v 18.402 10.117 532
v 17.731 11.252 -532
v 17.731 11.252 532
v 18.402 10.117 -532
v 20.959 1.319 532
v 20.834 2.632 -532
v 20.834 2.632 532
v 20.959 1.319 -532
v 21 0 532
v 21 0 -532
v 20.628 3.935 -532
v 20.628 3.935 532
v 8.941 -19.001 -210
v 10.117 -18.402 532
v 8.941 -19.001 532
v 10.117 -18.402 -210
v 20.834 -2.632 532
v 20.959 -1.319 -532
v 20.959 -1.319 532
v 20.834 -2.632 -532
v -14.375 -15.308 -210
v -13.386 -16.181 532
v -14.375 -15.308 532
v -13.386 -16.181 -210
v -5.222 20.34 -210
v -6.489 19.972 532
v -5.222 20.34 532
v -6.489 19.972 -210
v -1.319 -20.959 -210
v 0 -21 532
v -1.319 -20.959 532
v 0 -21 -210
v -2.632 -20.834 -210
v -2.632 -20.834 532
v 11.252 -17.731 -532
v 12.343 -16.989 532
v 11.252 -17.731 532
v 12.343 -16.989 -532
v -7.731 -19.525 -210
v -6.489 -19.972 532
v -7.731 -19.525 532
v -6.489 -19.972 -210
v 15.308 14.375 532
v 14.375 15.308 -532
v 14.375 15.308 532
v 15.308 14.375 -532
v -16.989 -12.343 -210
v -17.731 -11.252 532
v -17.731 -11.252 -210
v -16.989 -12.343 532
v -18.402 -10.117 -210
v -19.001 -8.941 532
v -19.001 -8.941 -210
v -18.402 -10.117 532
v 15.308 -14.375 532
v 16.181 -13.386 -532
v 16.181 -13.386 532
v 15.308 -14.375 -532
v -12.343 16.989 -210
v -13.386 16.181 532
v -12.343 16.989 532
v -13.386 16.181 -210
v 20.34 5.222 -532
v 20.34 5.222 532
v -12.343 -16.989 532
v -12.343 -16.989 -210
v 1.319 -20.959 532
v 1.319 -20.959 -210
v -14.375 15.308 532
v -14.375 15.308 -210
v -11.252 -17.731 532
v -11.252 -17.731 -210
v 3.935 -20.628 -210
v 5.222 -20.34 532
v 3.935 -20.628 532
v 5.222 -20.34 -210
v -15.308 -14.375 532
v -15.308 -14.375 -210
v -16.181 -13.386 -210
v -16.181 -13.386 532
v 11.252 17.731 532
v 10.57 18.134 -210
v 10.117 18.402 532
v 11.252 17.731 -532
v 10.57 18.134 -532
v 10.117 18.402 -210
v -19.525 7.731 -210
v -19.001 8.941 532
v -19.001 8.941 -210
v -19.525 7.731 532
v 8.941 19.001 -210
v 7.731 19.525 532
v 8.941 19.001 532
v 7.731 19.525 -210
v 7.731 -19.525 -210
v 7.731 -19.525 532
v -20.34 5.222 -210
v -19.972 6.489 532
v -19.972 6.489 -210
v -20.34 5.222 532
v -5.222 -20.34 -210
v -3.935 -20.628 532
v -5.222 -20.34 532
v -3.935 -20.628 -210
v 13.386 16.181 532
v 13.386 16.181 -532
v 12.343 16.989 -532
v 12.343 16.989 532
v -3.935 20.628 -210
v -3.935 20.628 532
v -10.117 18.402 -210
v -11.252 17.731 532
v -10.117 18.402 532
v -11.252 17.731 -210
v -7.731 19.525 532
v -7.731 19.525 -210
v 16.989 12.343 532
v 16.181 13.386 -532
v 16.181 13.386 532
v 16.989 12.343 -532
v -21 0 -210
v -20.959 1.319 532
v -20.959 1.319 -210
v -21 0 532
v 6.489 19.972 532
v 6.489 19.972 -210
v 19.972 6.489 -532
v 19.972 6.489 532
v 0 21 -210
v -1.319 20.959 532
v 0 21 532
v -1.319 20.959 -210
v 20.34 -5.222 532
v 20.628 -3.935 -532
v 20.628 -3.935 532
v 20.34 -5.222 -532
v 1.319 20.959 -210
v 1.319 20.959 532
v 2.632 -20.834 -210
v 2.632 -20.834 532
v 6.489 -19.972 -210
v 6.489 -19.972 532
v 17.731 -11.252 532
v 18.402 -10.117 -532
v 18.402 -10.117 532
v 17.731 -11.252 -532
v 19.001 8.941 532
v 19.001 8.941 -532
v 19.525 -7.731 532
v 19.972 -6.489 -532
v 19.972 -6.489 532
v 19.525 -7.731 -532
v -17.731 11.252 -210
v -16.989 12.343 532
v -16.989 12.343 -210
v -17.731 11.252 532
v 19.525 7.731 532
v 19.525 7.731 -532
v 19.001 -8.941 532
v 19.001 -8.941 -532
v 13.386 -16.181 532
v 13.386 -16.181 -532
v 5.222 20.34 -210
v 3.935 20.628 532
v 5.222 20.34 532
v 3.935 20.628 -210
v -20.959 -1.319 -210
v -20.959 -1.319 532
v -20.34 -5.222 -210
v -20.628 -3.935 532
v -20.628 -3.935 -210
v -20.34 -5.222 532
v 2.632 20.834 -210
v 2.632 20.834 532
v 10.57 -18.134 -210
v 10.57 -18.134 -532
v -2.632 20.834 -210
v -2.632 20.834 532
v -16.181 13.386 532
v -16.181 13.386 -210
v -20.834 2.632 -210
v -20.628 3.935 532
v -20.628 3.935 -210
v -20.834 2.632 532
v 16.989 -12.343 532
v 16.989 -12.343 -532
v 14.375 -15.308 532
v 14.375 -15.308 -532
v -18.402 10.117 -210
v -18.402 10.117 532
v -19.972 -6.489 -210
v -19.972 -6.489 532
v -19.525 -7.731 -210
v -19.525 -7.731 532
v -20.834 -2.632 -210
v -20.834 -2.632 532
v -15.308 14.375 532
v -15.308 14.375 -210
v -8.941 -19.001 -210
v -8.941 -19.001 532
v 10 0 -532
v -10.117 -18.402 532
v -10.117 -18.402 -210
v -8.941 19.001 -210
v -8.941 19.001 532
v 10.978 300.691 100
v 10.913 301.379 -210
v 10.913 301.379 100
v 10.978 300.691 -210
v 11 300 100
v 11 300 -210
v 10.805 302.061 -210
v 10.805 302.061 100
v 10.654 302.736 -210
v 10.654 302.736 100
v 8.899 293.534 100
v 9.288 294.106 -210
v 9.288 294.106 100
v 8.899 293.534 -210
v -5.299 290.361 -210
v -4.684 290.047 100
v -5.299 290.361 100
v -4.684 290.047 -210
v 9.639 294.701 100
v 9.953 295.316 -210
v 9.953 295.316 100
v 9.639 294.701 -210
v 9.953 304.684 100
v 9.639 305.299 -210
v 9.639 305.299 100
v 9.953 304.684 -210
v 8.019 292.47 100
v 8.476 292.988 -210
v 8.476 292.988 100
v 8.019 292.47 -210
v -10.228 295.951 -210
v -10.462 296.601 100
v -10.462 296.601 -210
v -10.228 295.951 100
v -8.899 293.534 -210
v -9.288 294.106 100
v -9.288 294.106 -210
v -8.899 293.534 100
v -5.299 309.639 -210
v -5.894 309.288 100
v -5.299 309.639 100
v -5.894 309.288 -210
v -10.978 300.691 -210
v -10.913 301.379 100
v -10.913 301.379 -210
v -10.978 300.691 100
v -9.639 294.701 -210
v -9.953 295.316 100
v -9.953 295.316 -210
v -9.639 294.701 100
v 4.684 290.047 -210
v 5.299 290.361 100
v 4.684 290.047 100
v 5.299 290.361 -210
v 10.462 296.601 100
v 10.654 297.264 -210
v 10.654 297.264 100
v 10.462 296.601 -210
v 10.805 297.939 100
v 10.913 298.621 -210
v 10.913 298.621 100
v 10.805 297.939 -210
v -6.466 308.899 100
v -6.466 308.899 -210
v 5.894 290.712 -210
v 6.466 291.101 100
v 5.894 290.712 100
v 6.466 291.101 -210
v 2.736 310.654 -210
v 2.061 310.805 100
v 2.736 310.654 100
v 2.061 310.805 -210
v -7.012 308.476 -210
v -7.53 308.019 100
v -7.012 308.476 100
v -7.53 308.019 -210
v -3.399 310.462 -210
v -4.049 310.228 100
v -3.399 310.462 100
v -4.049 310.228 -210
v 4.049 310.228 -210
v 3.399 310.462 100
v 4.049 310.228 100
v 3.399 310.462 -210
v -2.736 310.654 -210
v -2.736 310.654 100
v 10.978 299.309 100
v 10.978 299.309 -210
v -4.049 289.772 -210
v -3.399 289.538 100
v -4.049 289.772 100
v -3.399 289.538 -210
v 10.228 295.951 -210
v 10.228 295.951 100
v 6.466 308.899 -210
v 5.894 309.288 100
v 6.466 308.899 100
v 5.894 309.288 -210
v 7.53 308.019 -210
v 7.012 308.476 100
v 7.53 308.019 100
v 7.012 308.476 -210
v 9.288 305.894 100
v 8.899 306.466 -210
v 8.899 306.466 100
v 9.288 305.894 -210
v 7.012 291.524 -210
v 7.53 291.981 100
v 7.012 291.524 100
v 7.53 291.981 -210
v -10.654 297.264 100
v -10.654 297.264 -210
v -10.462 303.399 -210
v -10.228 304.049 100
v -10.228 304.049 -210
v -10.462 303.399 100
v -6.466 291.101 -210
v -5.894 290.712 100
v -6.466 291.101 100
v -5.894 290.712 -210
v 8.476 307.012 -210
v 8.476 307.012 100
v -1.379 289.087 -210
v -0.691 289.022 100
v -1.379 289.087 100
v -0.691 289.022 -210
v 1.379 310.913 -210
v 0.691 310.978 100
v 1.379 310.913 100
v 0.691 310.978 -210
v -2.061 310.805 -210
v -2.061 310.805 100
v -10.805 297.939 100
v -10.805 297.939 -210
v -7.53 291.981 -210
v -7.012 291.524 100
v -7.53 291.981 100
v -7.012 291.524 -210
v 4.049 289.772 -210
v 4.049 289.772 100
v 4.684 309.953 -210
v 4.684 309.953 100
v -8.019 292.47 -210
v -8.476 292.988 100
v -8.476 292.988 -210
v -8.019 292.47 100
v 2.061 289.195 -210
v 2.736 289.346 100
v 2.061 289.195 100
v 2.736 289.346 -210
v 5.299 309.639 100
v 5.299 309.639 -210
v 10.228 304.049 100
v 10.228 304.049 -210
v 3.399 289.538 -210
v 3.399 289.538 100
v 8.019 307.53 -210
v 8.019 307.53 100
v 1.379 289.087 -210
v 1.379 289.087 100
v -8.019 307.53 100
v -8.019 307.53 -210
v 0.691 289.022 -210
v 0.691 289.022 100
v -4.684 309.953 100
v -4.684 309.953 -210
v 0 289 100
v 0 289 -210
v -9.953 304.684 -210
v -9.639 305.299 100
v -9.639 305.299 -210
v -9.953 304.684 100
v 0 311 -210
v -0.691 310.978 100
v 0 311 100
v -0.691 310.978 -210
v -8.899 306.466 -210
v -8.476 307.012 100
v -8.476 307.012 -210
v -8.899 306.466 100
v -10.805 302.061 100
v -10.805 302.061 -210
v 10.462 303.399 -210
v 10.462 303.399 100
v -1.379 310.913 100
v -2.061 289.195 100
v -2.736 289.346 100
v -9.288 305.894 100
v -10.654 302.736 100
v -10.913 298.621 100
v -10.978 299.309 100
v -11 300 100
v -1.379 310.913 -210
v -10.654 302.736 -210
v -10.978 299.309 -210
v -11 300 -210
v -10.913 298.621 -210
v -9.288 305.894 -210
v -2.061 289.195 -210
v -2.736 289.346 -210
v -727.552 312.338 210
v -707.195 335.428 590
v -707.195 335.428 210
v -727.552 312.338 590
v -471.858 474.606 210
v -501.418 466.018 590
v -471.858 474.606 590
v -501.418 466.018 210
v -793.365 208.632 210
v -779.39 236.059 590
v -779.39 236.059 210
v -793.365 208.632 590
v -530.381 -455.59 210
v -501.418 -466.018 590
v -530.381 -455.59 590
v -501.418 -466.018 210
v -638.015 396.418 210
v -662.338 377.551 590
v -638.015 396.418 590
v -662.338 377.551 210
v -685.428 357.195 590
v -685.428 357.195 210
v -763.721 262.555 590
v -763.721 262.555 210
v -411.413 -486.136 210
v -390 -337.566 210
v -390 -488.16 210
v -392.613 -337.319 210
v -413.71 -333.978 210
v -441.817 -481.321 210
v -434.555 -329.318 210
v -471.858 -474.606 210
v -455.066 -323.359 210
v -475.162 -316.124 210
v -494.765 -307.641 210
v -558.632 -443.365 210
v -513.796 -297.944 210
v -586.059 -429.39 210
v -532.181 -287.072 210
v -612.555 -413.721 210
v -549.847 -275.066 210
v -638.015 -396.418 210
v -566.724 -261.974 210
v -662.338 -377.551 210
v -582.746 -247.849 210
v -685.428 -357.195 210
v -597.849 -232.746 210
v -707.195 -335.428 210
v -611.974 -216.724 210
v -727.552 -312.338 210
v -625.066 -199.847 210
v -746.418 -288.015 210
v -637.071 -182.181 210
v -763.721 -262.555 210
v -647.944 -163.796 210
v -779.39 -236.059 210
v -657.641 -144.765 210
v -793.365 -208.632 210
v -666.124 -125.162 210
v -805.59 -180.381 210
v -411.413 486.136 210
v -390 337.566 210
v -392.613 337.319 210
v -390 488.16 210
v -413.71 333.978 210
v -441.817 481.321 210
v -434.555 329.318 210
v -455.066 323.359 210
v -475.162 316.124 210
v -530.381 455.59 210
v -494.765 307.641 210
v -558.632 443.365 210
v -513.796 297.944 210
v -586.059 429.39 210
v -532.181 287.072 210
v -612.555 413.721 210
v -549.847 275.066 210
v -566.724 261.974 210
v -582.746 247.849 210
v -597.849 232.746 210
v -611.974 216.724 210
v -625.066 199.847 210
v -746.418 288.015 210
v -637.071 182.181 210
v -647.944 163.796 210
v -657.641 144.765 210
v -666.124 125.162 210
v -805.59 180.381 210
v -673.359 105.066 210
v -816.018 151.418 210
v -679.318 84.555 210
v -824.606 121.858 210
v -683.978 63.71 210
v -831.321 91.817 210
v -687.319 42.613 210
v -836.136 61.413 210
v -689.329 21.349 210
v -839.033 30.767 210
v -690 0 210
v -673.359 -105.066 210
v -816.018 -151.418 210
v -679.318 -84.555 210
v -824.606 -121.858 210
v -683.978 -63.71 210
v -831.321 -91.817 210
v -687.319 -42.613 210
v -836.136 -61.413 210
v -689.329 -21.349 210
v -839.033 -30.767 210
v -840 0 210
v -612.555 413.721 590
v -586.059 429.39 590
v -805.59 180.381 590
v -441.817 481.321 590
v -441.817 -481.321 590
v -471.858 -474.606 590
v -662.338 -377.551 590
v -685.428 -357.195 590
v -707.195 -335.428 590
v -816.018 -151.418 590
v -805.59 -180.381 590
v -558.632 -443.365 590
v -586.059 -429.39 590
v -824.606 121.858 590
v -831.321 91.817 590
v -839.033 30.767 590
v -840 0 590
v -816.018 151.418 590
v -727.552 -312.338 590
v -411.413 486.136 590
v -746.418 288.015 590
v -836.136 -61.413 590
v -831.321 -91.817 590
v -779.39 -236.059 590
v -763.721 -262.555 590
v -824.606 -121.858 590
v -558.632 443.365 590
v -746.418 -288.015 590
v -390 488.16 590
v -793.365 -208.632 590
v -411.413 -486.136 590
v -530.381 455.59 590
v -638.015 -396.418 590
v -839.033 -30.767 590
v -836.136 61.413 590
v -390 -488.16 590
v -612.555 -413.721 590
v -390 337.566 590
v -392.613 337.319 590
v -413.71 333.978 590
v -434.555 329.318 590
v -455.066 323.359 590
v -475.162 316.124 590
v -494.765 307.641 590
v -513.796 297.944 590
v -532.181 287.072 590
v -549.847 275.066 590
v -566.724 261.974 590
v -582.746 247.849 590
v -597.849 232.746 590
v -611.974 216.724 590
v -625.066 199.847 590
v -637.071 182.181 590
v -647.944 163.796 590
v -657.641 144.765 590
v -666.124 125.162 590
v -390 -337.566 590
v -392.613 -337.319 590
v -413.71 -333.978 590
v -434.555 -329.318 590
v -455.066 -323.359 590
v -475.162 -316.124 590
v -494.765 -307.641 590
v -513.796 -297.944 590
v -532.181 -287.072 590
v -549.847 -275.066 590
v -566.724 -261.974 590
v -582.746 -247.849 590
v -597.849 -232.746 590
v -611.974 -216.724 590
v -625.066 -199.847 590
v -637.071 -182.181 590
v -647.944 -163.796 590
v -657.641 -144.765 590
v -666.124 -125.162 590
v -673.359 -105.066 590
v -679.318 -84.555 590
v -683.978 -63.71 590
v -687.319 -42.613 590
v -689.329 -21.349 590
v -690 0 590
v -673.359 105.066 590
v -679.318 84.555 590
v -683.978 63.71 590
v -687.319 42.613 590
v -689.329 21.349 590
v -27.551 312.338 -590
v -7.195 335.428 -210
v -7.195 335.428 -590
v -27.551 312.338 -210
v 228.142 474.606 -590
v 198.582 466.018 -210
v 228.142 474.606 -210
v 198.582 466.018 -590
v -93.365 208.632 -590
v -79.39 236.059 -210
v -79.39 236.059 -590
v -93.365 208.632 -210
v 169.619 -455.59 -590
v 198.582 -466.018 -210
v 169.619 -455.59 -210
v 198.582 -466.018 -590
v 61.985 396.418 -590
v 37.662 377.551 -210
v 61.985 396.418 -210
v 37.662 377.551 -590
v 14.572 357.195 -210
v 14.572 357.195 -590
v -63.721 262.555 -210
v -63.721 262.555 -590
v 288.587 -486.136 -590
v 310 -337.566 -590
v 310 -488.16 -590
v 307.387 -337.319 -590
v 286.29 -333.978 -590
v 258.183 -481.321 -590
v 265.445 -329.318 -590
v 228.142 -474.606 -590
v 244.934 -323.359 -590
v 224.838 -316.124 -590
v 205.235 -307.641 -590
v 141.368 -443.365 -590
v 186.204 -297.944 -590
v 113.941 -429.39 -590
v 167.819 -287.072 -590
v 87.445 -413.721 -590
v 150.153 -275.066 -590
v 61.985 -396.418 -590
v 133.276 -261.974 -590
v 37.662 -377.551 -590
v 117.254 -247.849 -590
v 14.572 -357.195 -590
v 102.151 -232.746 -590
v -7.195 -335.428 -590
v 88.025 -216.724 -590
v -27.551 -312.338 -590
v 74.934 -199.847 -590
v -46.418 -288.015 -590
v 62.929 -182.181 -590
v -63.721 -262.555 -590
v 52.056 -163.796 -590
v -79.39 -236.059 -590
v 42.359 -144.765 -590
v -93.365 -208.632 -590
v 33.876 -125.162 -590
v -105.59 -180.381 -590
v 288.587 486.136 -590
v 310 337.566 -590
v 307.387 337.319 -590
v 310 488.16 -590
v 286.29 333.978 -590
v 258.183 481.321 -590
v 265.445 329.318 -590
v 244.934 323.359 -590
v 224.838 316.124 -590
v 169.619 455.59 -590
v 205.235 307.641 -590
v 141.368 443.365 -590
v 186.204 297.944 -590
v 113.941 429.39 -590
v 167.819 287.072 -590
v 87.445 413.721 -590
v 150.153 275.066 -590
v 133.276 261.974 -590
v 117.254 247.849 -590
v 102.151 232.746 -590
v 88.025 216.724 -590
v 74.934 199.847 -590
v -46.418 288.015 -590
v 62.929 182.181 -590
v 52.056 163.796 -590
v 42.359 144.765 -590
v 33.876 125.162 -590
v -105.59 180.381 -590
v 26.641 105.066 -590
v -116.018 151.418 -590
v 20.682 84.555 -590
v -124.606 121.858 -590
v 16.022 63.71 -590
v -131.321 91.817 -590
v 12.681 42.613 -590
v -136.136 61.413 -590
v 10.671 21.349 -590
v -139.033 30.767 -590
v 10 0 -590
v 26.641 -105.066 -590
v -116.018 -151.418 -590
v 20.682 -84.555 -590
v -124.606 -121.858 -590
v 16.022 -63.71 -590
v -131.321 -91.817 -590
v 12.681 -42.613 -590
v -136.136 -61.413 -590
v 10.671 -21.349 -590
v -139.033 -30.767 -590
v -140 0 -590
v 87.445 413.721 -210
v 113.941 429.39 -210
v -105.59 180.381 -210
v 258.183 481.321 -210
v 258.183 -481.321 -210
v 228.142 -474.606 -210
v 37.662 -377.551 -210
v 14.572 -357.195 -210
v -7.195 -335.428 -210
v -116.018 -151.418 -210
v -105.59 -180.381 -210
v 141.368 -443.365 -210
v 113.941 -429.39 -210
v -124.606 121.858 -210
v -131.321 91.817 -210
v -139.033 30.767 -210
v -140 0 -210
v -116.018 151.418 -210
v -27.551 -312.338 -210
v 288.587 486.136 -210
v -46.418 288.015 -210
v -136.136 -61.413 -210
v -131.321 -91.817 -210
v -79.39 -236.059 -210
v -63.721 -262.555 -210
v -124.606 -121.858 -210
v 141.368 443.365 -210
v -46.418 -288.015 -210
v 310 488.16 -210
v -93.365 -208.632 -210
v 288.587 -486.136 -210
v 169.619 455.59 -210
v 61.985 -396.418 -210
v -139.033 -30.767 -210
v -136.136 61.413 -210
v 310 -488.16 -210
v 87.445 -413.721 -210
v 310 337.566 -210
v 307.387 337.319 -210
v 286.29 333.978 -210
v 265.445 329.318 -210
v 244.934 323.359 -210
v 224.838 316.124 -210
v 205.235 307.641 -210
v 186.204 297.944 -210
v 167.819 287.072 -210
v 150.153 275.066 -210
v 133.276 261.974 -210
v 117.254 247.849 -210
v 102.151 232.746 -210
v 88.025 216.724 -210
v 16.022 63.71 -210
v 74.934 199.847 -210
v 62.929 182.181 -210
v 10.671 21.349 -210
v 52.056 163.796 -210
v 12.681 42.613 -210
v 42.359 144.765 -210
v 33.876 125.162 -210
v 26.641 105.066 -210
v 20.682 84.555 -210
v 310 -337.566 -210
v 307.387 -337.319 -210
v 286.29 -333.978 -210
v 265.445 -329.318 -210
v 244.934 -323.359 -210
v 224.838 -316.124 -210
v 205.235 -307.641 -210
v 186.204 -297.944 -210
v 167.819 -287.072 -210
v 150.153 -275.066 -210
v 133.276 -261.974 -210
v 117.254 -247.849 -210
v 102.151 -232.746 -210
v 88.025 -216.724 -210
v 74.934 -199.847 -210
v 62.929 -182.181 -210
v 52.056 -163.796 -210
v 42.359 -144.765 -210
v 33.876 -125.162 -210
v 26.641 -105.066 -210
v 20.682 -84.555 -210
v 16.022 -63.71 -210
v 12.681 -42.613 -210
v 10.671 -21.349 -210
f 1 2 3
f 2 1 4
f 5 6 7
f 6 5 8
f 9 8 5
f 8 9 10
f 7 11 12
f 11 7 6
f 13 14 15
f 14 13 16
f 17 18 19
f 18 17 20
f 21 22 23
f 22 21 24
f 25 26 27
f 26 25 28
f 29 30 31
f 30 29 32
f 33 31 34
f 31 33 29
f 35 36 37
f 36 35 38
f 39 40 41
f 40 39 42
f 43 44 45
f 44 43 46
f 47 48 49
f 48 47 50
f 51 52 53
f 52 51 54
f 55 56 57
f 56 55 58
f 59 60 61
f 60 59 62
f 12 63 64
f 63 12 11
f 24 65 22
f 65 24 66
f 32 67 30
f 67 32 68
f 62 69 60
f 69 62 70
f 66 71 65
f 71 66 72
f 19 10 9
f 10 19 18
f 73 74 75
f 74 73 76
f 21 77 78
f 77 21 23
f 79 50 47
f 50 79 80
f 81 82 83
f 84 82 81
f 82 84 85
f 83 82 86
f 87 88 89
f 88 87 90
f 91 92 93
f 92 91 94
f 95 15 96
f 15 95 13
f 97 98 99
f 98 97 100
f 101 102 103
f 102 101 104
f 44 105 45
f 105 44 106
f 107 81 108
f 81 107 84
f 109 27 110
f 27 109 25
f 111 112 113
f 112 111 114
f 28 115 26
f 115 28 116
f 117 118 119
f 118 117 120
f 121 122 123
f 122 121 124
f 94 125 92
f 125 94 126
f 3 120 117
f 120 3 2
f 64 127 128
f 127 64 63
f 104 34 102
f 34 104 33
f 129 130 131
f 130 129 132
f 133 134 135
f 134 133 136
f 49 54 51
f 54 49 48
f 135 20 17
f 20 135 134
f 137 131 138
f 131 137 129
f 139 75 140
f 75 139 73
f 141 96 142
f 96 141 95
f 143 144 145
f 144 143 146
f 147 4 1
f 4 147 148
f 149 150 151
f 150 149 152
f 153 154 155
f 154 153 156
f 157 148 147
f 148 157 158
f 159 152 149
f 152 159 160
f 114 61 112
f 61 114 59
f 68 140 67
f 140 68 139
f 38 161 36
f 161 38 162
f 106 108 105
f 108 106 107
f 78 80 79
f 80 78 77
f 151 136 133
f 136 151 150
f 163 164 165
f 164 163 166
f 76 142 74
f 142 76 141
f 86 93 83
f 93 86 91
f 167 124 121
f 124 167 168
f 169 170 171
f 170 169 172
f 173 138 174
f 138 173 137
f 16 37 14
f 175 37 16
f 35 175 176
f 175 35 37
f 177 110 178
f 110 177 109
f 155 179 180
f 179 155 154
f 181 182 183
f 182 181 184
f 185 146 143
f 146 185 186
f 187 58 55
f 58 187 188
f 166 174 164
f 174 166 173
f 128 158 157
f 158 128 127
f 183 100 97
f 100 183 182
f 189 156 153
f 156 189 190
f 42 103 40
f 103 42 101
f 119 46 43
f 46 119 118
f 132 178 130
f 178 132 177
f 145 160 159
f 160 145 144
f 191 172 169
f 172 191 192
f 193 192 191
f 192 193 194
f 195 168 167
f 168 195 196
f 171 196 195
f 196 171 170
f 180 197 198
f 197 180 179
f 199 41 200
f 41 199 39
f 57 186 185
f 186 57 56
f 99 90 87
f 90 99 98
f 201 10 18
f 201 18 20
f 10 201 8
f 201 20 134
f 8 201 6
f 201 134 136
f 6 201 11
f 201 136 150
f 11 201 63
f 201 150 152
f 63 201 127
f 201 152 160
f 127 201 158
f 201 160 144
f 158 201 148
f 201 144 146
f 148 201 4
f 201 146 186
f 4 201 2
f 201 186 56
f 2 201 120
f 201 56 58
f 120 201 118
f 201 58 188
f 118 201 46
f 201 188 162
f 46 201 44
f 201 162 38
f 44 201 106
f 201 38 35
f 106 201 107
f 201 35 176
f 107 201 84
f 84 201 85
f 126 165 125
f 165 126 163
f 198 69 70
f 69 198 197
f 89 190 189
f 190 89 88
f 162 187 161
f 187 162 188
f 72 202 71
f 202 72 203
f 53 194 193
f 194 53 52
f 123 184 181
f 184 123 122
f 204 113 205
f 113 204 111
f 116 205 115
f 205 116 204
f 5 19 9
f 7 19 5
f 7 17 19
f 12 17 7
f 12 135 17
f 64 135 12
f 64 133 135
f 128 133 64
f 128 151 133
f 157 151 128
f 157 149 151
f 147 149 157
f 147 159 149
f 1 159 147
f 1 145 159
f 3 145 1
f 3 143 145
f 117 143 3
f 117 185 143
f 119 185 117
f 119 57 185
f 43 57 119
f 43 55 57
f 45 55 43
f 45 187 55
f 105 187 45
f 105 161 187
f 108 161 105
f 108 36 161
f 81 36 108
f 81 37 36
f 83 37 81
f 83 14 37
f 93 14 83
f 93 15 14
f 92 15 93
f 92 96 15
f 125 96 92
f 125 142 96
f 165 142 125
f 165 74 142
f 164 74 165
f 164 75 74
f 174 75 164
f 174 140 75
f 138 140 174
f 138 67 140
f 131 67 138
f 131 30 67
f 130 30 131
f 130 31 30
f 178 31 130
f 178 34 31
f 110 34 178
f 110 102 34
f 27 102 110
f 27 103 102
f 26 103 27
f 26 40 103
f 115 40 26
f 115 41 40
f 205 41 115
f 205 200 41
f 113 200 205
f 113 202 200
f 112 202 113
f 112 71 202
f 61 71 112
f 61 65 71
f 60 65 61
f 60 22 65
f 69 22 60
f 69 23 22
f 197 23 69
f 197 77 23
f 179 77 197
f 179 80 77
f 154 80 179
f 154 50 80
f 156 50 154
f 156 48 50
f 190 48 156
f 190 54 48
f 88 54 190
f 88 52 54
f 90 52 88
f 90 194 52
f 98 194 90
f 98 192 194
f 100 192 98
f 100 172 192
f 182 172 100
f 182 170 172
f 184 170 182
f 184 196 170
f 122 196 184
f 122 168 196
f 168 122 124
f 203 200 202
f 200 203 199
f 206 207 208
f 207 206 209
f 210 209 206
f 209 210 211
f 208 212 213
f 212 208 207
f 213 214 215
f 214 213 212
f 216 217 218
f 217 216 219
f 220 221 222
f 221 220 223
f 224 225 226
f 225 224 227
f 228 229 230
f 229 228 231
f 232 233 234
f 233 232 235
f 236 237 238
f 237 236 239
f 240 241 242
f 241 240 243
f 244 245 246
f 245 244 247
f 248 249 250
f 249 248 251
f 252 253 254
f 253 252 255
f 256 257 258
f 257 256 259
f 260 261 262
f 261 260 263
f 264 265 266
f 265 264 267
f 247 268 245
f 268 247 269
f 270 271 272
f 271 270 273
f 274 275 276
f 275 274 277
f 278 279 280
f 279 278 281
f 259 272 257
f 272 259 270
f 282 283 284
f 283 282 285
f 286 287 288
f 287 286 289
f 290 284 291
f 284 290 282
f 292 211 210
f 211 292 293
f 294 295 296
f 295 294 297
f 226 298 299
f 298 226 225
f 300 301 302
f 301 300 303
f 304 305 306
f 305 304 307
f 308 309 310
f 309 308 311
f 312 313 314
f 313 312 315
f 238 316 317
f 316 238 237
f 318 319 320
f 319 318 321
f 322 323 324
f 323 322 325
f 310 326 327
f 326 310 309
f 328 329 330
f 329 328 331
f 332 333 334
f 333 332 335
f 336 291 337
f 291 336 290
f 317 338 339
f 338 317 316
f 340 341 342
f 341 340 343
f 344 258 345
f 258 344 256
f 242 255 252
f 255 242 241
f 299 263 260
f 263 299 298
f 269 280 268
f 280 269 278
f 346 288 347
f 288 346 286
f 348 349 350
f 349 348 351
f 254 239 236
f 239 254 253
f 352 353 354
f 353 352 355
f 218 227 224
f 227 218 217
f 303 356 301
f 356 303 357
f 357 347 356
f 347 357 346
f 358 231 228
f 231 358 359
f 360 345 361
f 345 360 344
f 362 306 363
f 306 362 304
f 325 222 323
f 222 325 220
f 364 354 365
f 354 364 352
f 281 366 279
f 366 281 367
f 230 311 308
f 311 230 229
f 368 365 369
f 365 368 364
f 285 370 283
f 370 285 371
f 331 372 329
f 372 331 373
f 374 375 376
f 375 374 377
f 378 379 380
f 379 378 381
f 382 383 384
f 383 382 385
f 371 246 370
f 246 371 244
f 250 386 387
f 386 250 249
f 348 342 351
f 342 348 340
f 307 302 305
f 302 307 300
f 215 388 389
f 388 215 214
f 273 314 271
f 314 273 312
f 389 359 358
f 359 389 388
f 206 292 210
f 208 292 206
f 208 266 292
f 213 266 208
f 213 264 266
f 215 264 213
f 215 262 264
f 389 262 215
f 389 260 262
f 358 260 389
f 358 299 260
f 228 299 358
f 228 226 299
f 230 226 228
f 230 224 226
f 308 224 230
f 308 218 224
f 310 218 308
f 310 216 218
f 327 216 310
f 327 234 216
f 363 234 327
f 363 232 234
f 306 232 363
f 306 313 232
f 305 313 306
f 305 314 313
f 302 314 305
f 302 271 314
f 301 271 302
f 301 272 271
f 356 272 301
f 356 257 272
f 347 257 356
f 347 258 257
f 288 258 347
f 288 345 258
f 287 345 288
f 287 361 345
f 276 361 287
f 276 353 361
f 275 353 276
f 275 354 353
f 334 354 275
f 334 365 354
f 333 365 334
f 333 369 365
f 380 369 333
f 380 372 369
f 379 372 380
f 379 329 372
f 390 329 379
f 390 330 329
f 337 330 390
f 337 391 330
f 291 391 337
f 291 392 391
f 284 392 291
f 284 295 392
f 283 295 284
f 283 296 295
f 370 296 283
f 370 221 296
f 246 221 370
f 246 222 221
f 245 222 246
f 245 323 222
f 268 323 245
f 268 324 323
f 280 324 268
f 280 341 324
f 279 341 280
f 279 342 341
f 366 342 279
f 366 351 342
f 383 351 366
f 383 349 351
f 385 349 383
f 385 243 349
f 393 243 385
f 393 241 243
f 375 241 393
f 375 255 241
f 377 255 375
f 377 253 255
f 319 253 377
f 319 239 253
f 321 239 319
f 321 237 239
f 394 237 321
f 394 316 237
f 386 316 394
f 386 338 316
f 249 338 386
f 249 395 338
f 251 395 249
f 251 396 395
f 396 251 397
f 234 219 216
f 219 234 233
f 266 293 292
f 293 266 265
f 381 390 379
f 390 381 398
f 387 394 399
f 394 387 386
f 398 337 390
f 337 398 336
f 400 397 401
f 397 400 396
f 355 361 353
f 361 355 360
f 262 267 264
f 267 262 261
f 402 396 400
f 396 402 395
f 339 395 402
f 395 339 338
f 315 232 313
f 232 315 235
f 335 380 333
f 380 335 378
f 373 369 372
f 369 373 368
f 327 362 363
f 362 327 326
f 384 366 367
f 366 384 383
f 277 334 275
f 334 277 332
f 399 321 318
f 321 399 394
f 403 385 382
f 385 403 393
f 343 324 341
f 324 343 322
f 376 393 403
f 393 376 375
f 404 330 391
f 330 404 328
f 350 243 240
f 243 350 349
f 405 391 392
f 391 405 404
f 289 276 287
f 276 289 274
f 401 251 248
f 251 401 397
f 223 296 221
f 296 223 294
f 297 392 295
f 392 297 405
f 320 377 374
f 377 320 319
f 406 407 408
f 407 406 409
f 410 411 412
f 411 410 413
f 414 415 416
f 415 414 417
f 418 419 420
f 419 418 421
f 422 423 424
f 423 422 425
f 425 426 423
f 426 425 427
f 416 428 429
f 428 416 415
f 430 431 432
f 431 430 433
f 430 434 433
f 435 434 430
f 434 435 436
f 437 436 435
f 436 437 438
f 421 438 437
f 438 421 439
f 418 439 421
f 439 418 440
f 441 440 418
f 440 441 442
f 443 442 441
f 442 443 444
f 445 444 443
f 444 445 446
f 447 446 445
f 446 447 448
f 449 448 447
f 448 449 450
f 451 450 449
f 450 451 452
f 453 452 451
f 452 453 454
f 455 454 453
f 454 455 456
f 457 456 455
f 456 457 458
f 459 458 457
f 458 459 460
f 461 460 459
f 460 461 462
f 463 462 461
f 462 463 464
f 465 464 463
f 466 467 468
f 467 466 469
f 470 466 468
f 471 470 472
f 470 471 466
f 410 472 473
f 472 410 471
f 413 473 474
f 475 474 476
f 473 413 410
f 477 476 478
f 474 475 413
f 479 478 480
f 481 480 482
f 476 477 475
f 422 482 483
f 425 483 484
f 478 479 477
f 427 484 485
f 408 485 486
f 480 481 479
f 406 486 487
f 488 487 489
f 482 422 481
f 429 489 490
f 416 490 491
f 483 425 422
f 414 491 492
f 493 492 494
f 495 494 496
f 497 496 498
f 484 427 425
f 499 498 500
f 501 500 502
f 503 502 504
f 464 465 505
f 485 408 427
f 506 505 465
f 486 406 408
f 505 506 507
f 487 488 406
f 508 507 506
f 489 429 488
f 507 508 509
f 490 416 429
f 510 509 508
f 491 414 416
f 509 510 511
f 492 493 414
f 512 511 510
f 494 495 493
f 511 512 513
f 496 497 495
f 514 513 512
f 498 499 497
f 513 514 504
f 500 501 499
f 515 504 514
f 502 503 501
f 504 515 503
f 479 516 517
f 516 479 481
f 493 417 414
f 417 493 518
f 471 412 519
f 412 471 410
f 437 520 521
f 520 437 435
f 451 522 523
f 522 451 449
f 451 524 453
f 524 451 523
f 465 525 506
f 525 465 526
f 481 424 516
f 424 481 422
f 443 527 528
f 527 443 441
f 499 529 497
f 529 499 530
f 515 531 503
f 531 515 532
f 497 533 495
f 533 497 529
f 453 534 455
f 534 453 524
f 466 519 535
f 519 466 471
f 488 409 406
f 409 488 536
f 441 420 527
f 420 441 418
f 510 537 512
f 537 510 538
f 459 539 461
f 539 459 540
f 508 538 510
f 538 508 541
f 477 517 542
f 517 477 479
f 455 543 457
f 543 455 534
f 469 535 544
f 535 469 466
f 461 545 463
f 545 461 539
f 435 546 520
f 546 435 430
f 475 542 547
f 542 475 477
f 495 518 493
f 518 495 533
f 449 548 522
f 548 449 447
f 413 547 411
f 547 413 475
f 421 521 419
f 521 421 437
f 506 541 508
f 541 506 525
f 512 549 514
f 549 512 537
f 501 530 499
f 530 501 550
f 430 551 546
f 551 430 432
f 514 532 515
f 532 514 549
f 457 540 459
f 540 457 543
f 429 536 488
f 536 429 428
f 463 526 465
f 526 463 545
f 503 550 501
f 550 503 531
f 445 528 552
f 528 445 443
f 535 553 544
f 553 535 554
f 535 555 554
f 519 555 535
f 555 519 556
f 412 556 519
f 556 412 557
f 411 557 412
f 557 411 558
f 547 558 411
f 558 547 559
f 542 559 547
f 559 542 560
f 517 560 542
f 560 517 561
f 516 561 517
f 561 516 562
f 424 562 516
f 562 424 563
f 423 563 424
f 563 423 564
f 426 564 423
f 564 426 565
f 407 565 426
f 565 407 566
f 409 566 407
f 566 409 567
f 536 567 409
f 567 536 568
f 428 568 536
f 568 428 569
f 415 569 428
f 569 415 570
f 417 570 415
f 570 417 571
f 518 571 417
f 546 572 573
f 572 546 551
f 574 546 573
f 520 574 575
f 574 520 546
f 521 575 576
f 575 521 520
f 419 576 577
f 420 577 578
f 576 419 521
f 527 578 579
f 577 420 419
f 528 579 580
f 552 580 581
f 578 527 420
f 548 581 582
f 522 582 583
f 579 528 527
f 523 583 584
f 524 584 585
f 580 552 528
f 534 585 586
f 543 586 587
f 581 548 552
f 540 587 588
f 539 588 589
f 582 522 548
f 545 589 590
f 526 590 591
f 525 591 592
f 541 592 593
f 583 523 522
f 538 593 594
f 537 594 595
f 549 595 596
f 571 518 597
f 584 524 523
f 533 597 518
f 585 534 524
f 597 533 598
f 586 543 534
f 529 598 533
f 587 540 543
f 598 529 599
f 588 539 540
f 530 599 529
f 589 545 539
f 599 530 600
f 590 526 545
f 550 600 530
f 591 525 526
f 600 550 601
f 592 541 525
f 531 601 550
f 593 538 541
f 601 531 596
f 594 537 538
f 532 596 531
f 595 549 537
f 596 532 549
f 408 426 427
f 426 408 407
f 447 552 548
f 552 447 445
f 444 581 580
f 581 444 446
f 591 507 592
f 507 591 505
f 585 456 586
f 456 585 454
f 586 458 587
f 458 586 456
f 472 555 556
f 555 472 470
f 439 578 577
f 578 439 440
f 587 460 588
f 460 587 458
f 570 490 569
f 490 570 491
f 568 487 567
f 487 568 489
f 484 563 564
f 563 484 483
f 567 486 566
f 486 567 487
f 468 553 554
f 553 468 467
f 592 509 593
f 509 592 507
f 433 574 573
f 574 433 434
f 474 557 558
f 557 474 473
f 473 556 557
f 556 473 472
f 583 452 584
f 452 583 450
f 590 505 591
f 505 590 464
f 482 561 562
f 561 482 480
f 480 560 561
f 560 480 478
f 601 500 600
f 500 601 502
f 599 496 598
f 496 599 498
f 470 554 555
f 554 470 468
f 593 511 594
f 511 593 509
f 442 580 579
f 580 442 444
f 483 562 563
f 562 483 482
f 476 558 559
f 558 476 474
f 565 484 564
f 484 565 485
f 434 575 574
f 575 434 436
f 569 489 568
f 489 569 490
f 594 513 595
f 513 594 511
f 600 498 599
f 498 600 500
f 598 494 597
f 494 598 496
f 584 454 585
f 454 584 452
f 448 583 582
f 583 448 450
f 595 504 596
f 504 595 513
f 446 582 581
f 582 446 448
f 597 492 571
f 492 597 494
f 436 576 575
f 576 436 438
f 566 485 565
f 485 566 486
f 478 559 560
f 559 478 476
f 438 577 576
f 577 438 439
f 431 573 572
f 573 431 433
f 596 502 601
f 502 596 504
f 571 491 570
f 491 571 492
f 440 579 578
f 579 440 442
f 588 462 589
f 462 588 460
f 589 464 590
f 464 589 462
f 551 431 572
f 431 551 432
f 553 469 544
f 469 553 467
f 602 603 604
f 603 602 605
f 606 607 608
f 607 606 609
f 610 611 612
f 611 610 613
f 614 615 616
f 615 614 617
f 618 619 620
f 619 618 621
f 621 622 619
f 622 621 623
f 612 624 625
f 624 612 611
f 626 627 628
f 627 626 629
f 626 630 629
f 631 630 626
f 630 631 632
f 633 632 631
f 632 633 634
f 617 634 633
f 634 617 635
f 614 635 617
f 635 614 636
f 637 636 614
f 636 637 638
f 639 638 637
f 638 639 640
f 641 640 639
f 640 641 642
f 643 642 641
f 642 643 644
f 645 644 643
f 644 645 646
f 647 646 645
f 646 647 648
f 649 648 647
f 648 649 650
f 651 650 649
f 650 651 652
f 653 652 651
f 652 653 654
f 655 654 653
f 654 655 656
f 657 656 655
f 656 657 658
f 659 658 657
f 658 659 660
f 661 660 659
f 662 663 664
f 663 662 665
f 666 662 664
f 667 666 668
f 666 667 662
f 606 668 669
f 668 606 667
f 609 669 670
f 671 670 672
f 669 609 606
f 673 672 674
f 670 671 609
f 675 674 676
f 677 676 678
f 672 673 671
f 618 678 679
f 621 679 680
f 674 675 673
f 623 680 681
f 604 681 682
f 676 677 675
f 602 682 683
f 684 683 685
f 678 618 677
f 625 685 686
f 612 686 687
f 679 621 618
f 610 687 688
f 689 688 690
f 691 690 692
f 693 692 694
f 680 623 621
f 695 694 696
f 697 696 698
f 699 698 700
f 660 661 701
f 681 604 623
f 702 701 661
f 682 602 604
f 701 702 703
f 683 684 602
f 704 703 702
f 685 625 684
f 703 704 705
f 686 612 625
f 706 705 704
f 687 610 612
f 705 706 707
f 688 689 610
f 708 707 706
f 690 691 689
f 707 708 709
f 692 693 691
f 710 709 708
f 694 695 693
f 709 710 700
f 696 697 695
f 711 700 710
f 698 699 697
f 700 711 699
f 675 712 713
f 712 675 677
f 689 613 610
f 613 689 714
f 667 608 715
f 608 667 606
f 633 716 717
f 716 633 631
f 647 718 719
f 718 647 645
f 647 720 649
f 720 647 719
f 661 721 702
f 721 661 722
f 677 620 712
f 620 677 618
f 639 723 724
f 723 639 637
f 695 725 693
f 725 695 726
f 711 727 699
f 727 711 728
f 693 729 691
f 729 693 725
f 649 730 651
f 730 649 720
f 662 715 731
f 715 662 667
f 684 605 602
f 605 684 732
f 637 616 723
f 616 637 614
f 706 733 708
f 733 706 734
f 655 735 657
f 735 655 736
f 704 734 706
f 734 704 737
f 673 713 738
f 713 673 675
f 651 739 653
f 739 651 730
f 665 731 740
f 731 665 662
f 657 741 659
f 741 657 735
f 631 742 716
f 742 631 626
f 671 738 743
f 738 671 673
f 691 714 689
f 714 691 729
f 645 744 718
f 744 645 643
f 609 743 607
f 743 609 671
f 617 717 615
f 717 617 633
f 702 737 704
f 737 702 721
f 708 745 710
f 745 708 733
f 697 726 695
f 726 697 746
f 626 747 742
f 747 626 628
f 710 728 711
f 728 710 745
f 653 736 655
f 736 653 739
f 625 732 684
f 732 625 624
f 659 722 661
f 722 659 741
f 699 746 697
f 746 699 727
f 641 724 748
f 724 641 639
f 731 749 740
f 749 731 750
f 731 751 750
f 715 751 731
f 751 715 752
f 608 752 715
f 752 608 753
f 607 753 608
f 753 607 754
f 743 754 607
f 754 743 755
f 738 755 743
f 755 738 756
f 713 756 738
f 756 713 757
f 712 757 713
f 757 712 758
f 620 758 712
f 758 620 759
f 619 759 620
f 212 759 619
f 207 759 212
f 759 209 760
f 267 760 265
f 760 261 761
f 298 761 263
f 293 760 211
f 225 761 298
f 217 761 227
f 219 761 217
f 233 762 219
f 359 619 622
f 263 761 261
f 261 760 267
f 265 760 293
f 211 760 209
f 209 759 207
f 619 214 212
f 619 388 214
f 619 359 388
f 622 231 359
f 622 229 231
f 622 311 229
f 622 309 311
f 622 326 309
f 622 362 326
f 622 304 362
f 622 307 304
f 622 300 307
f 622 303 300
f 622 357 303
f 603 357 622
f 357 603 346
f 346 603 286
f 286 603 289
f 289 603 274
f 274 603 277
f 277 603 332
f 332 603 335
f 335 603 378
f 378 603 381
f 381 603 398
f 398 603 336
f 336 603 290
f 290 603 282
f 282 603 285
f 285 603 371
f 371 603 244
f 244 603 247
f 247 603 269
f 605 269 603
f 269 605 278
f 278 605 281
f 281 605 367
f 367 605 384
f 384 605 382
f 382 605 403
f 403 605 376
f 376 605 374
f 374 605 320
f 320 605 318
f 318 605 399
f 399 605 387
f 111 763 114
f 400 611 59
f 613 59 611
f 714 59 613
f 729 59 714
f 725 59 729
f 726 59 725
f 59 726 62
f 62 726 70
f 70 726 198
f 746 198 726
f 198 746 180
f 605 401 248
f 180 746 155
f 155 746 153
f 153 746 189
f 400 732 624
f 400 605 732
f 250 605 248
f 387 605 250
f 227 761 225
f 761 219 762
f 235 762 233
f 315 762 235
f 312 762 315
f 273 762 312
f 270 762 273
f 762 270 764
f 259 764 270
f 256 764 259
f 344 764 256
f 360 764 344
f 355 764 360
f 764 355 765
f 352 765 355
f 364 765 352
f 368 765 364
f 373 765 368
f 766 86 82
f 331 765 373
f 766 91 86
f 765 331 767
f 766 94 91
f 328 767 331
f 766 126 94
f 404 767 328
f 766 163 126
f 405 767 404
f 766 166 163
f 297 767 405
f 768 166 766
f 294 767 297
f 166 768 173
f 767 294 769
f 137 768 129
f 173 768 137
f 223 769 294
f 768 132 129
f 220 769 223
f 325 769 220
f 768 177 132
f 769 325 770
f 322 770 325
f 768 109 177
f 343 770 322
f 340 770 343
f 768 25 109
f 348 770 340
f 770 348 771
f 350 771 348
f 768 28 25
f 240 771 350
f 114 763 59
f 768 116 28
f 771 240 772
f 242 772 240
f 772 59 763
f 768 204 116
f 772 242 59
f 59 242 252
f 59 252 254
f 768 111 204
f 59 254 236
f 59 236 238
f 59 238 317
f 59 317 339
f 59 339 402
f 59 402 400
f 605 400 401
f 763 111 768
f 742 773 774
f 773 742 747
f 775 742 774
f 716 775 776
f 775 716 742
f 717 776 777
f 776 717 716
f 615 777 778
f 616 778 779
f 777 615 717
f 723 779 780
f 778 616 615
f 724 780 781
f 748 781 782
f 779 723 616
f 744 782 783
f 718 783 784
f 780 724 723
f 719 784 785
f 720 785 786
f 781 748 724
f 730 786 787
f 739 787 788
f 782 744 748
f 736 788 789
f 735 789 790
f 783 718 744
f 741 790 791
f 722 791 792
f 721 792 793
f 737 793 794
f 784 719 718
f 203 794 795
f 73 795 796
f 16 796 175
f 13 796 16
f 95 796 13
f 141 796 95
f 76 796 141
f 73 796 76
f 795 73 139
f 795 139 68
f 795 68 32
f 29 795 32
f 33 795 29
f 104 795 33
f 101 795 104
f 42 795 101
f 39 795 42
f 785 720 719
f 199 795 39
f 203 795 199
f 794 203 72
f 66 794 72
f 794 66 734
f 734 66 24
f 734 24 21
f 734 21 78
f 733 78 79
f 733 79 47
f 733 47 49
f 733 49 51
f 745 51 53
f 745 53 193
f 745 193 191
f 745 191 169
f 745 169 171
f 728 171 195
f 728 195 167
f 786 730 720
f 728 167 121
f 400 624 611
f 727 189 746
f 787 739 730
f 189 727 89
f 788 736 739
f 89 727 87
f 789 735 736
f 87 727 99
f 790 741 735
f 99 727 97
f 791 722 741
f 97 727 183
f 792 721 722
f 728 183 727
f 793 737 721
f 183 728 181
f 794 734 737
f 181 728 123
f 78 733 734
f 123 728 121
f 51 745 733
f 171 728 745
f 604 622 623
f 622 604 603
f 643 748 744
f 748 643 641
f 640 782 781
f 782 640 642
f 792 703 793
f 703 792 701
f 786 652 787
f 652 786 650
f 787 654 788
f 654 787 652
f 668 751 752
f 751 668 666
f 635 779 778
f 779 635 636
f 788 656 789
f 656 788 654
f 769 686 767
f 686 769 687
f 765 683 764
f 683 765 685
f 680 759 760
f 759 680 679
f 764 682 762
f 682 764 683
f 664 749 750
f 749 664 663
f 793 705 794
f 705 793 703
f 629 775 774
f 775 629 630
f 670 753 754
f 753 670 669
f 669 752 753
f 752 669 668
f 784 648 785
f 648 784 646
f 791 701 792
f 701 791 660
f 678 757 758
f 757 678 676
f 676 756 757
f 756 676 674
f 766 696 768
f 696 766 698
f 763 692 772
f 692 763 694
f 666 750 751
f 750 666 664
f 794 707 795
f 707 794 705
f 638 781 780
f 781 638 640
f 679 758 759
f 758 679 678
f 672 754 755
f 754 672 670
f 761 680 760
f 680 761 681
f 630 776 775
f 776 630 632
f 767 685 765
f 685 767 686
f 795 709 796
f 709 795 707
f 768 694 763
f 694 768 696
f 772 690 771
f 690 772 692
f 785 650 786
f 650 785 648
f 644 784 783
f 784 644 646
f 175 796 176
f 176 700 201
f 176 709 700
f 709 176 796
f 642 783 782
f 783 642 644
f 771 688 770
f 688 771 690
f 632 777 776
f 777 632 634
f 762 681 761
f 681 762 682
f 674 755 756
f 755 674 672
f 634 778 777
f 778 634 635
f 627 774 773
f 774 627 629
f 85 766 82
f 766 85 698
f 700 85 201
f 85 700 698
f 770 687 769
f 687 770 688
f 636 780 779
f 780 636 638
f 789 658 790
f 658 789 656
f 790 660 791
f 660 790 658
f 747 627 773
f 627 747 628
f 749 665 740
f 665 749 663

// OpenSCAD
// ============================================================================
// PROJECT: XXXG-00W0 WING GUNDAM ZERO EW - UPPER CHASSIS CORE
// COMPONENT VAULT: BANDAI CAST RUNNER A - TORSO COLLAR PLATES A17 & A18
// MANUFACTURING SPECS: SOLID-STATE INTEGRATED HARNESS CONDUITS
// DESIGN PARITY: HEAD COWL CLEARANCE BORE & 50mm HEAT DEFENSE WALLS
// ============================================================================

$fn = 100; // Circular segment rendering resolution count

// Structural Constants Scaled 1:1 for a 16.7-Meter Airframe Scale (mm)
collar_ring_height = 380;               // Total vertical thickness of collar ring (mm)
neck_pivot_bore_diameter = 680;         // Central head joint clearance path (mm)
armor_defense_wall = 50;                // Solid TiAl protective wall thickness (mm)
harness_conduit_width = 80;             // Cast-in 4oz copper logic trace track (mm)

module Runner_A_Collar_Forge() {
    // Central Supply Injection Runner Axis (Molten Feed Line from Siphon Forge)
    color([0.22, 0.22, 0.25]) {
        cylinder(h = collar_ring_height * 2.8, d = 42, center = true);
        // Direct injection gates tracking straight into the part mold cavities
        translate() rotate() cylinder(h = 400, d = 22);
        translate([0, 300, -300]) rotate() cylinder(h = 400, d = 22);
    }
    
    // Instantiate Scaled Skeutomorphic Part Molds Symmetrically (Left & Right)
    Cast_Torso_Collar_Plates();
}

module Cast_Torso_Collar_Plates() {
    // ---- PART A17: UPPER TORSO COLLAR PLATING (LEFT HALF-SHELL) ---- [Page 8, Step 12]
    translate([-350, 0, 400]) color([0.85, 0.85, 0.9]) { // Classic White Armor Spec
        difference() {
            // Main high-strength structural collar ring outer quadrant
            cylinder(h = collar_ring_height, d = neck_pivot_bore_diameter + (armor_defense_wall * 2) + 200, center = true);
            
            // Central Neck Pivot Clearance Bore (Clears head axis tracking components)
            cylinder(h = collar_ring_height + 20, d = neck_pivot_bore_diameter, center = true);
            
            // Continuous cast-in routing track for the 4oz solid-state wiring rails
            cube([harness_conduit_width, neck_pivot_bore_diameter + 300, collar_ring_height + 10], center = true);
            
            // Slicing profile tool to generate an asymmetrical half-shell part component
            translate([neck_pivot_bore_diameter, 0, 0])
                cube([neck_pivot_bore_diameter * 2, neck_pivot_bore_diameter * 2, collar_ring_height * 2], center = true);
        }
    }
    
    // ---- PART A18: UPPER TORSO COLLAR PLATING (RIGHT HALF-SHELL) ---- [Page 8, Step 12]
    translate([350, 0, -400]) rotate() color([0.85, 0.85, 0.9]) {
        difference() {
            cylinder(h = collar_ring_height, d = neck_pivot_bore_diameter + (armor_defense_wall * 2) + 200, center = true);
            cylinder(h = collar_ring_height + 20, d = neck_pivot_bore_diameter, center = true);
            cube([harness_conduit_width, neck_pivot_bore_diameter + 300, collar_ring_height + 10], center = true);
            translate([neck_pivot_bore_diameter, 0, 0])
                cube([neck_pivot_bore_diameter * 2, neck_pivot_bore_diameter * 2, collar_ring_height * 2], center = true);
        }
    }
}

// Render Master Assembly to Parameter Workspace
Runner_A_Collar_Forge();
